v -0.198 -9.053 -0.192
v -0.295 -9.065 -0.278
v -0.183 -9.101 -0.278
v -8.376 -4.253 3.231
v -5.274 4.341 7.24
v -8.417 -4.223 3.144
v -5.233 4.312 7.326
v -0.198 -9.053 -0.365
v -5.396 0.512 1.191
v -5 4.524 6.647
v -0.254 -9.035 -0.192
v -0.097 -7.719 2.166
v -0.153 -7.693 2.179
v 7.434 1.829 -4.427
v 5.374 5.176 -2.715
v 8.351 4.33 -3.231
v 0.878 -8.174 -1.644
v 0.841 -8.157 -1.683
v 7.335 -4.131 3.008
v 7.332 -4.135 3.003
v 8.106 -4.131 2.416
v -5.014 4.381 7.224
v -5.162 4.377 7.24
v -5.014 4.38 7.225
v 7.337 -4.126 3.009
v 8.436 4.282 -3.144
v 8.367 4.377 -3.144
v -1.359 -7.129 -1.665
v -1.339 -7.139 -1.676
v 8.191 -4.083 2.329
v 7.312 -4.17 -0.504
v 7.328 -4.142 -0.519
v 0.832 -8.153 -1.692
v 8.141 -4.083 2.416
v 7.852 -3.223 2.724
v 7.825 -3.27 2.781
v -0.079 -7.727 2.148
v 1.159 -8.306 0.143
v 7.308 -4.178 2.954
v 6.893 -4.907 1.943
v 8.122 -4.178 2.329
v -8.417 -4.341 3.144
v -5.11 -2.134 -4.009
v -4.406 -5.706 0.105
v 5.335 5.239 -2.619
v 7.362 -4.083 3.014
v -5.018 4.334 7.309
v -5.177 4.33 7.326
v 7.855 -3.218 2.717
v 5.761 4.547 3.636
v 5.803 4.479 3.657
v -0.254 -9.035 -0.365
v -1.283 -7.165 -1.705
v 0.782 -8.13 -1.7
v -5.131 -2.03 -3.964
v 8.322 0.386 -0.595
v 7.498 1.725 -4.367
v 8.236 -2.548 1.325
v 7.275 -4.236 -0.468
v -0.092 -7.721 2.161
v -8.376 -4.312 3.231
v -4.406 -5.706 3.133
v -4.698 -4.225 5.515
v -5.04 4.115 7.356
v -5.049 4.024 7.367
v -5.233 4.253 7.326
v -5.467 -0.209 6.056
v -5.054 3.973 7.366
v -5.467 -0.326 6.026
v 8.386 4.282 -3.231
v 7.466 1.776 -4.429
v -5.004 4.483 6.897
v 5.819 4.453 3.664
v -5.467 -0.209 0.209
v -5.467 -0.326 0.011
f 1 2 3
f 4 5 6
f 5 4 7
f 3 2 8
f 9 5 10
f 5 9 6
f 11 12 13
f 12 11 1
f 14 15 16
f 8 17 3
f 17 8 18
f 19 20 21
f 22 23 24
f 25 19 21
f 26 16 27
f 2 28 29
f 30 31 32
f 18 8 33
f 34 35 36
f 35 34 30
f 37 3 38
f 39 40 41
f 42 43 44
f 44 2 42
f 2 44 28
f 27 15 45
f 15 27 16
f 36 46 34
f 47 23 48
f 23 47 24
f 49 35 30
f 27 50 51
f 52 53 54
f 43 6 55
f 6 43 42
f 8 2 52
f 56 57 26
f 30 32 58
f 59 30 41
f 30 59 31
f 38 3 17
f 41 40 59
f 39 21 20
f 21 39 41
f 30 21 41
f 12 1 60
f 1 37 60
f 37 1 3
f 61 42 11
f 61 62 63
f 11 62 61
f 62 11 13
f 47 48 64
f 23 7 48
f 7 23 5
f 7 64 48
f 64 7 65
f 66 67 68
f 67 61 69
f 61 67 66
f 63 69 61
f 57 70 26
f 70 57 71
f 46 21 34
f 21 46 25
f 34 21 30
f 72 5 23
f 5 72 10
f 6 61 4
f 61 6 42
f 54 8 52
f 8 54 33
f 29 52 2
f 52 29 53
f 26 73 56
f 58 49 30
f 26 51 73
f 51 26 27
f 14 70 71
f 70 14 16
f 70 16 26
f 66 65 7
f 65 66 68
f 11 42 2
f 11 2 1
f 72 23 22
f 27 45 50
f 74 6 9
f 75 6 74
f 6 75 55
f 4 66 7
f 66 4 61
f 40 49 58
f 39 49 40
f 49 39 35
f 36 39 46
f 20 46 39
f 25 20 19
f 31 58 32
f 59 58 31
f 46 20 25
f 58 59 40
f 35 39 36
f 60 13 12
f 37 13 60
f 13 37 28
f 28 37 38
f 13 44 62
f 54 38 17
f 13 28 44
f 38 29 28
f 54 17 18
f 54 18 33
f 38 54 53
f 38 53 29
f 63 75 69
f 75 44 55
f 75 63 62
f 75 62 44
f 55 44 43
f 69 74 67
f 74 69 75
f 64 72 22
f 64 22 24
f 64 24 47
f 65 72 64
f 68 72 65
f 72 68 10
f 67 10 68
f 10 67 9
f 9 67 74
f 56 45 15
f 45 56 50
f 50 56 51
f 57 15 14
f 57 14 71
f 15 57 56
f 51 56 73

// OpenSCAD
// Auto-generated OpenSCAD file

    inner_points = 10*[[-0.4553770683985672, 0.816075390462194, -0.02826725120202972], [-0.3492651290097586, 0.27808264626453244, -0.8645112727111914], [0.3062996757811438, -0.4214091552352098, 0.8645112727111914], [0.4124116151699524, -0.9594018994328712, 0.02826725120202972], [0.45789115536956515, 0.630471121507822, -0.3908857929250278], [0.9045034915748815, -0.09513310390029023, 0.13259861870450954], [-0.5386073879474271, -0.026770981308893688, 0.5034118884114294], [-0.43249544855861854, -0.5647637255065552, -0.33283213309773235], [0.28106973038452526, 0.5396015179782265, 0.5891534403817997], [0.44860512332870417, -0.3098111524472321, -0.7311548260368412]];

    outer_points = 10*[[-0.8336003958246909, -0.4282242422434667, 0.3144481157395024], [-0.5192798779886039, 0.4282242422434667, 0.7239583176726031], [0.5192798779886039, -0.4282242422434667, -0.7239583176726031], [0.8336003958246909, 0.4282242422434667, -0.3144481157395024], [0.015816542021752034, -0.40830815643207485, 0.8417945059096876], [0.8090835339719289, -0.40830815643207485, 0.2329205620737586], [-0.42955329110383256, -0.15856661937867184, -0.559640382982223], [-0.11523277326774545, 0.6978818651082617, -0.15013018104912235], [-0.02137609852116739, -0.9005841684864844, -0.02784969457994478], [0.47489050229114943, 0.45162402044515604, 0.6187076390309791]];

    // Convex hull for inner set (I)
    module inner_hull() {
        hull() {
            for (p = inner_points) {
                translate(p) sphere(r=0.1);
            }
        }
    }

    // Convex hull for outer set (O) minus inner hull (O \ I)
    module outer_minus_inner() {
        difference() {
            hull() {
                for (p = outer_points) {
                    translate(p) sphere(r=0.1);
                }
            }
            inner_hull(); // Subtract inner hull
        }
    }

    // Convex hull for outer set (O) minus all translated inner hulls
    module outer_minus_AllTranslationInner() {
        difference() {
            hull() {
                for (p = outer_points) {
                    translate(p) sphere(r=0.1);
                }
            }
            hull() {
                translate([0,0,50]) inner_hull();
                translate([0,0,-50]) inner_hull();
            }; // Subtract translated inner hulls
        }
    }

    // Difference between outer_minus_inner and outer_minus_AllTranslationInner
    module outer_minus_inner_diff() {
        difference() {
            // Outer minus inner
            difference() {
                hull() {
                    for (p = outer_points) {
                        translate(p) sphere(r=0.1);
                    }
                }
                inner_hull();
            }

            // Subtract Outer minus AllTranslationInner
            difference() {
                hull() {
                    for (p = outer_points) {
                        translate(p) sphere(r=0.1);
                    }
                }
                hull() {
                    translate([0,0,50]) inner_hull();
                    translate([0,0,-50]) inner_hull();
                };
            }
        }
    }

    // Rendering all with colors applied
    color([0, 1, 0, 1]) outer_minus_AllTranslationInner(); // Opaque green
    
